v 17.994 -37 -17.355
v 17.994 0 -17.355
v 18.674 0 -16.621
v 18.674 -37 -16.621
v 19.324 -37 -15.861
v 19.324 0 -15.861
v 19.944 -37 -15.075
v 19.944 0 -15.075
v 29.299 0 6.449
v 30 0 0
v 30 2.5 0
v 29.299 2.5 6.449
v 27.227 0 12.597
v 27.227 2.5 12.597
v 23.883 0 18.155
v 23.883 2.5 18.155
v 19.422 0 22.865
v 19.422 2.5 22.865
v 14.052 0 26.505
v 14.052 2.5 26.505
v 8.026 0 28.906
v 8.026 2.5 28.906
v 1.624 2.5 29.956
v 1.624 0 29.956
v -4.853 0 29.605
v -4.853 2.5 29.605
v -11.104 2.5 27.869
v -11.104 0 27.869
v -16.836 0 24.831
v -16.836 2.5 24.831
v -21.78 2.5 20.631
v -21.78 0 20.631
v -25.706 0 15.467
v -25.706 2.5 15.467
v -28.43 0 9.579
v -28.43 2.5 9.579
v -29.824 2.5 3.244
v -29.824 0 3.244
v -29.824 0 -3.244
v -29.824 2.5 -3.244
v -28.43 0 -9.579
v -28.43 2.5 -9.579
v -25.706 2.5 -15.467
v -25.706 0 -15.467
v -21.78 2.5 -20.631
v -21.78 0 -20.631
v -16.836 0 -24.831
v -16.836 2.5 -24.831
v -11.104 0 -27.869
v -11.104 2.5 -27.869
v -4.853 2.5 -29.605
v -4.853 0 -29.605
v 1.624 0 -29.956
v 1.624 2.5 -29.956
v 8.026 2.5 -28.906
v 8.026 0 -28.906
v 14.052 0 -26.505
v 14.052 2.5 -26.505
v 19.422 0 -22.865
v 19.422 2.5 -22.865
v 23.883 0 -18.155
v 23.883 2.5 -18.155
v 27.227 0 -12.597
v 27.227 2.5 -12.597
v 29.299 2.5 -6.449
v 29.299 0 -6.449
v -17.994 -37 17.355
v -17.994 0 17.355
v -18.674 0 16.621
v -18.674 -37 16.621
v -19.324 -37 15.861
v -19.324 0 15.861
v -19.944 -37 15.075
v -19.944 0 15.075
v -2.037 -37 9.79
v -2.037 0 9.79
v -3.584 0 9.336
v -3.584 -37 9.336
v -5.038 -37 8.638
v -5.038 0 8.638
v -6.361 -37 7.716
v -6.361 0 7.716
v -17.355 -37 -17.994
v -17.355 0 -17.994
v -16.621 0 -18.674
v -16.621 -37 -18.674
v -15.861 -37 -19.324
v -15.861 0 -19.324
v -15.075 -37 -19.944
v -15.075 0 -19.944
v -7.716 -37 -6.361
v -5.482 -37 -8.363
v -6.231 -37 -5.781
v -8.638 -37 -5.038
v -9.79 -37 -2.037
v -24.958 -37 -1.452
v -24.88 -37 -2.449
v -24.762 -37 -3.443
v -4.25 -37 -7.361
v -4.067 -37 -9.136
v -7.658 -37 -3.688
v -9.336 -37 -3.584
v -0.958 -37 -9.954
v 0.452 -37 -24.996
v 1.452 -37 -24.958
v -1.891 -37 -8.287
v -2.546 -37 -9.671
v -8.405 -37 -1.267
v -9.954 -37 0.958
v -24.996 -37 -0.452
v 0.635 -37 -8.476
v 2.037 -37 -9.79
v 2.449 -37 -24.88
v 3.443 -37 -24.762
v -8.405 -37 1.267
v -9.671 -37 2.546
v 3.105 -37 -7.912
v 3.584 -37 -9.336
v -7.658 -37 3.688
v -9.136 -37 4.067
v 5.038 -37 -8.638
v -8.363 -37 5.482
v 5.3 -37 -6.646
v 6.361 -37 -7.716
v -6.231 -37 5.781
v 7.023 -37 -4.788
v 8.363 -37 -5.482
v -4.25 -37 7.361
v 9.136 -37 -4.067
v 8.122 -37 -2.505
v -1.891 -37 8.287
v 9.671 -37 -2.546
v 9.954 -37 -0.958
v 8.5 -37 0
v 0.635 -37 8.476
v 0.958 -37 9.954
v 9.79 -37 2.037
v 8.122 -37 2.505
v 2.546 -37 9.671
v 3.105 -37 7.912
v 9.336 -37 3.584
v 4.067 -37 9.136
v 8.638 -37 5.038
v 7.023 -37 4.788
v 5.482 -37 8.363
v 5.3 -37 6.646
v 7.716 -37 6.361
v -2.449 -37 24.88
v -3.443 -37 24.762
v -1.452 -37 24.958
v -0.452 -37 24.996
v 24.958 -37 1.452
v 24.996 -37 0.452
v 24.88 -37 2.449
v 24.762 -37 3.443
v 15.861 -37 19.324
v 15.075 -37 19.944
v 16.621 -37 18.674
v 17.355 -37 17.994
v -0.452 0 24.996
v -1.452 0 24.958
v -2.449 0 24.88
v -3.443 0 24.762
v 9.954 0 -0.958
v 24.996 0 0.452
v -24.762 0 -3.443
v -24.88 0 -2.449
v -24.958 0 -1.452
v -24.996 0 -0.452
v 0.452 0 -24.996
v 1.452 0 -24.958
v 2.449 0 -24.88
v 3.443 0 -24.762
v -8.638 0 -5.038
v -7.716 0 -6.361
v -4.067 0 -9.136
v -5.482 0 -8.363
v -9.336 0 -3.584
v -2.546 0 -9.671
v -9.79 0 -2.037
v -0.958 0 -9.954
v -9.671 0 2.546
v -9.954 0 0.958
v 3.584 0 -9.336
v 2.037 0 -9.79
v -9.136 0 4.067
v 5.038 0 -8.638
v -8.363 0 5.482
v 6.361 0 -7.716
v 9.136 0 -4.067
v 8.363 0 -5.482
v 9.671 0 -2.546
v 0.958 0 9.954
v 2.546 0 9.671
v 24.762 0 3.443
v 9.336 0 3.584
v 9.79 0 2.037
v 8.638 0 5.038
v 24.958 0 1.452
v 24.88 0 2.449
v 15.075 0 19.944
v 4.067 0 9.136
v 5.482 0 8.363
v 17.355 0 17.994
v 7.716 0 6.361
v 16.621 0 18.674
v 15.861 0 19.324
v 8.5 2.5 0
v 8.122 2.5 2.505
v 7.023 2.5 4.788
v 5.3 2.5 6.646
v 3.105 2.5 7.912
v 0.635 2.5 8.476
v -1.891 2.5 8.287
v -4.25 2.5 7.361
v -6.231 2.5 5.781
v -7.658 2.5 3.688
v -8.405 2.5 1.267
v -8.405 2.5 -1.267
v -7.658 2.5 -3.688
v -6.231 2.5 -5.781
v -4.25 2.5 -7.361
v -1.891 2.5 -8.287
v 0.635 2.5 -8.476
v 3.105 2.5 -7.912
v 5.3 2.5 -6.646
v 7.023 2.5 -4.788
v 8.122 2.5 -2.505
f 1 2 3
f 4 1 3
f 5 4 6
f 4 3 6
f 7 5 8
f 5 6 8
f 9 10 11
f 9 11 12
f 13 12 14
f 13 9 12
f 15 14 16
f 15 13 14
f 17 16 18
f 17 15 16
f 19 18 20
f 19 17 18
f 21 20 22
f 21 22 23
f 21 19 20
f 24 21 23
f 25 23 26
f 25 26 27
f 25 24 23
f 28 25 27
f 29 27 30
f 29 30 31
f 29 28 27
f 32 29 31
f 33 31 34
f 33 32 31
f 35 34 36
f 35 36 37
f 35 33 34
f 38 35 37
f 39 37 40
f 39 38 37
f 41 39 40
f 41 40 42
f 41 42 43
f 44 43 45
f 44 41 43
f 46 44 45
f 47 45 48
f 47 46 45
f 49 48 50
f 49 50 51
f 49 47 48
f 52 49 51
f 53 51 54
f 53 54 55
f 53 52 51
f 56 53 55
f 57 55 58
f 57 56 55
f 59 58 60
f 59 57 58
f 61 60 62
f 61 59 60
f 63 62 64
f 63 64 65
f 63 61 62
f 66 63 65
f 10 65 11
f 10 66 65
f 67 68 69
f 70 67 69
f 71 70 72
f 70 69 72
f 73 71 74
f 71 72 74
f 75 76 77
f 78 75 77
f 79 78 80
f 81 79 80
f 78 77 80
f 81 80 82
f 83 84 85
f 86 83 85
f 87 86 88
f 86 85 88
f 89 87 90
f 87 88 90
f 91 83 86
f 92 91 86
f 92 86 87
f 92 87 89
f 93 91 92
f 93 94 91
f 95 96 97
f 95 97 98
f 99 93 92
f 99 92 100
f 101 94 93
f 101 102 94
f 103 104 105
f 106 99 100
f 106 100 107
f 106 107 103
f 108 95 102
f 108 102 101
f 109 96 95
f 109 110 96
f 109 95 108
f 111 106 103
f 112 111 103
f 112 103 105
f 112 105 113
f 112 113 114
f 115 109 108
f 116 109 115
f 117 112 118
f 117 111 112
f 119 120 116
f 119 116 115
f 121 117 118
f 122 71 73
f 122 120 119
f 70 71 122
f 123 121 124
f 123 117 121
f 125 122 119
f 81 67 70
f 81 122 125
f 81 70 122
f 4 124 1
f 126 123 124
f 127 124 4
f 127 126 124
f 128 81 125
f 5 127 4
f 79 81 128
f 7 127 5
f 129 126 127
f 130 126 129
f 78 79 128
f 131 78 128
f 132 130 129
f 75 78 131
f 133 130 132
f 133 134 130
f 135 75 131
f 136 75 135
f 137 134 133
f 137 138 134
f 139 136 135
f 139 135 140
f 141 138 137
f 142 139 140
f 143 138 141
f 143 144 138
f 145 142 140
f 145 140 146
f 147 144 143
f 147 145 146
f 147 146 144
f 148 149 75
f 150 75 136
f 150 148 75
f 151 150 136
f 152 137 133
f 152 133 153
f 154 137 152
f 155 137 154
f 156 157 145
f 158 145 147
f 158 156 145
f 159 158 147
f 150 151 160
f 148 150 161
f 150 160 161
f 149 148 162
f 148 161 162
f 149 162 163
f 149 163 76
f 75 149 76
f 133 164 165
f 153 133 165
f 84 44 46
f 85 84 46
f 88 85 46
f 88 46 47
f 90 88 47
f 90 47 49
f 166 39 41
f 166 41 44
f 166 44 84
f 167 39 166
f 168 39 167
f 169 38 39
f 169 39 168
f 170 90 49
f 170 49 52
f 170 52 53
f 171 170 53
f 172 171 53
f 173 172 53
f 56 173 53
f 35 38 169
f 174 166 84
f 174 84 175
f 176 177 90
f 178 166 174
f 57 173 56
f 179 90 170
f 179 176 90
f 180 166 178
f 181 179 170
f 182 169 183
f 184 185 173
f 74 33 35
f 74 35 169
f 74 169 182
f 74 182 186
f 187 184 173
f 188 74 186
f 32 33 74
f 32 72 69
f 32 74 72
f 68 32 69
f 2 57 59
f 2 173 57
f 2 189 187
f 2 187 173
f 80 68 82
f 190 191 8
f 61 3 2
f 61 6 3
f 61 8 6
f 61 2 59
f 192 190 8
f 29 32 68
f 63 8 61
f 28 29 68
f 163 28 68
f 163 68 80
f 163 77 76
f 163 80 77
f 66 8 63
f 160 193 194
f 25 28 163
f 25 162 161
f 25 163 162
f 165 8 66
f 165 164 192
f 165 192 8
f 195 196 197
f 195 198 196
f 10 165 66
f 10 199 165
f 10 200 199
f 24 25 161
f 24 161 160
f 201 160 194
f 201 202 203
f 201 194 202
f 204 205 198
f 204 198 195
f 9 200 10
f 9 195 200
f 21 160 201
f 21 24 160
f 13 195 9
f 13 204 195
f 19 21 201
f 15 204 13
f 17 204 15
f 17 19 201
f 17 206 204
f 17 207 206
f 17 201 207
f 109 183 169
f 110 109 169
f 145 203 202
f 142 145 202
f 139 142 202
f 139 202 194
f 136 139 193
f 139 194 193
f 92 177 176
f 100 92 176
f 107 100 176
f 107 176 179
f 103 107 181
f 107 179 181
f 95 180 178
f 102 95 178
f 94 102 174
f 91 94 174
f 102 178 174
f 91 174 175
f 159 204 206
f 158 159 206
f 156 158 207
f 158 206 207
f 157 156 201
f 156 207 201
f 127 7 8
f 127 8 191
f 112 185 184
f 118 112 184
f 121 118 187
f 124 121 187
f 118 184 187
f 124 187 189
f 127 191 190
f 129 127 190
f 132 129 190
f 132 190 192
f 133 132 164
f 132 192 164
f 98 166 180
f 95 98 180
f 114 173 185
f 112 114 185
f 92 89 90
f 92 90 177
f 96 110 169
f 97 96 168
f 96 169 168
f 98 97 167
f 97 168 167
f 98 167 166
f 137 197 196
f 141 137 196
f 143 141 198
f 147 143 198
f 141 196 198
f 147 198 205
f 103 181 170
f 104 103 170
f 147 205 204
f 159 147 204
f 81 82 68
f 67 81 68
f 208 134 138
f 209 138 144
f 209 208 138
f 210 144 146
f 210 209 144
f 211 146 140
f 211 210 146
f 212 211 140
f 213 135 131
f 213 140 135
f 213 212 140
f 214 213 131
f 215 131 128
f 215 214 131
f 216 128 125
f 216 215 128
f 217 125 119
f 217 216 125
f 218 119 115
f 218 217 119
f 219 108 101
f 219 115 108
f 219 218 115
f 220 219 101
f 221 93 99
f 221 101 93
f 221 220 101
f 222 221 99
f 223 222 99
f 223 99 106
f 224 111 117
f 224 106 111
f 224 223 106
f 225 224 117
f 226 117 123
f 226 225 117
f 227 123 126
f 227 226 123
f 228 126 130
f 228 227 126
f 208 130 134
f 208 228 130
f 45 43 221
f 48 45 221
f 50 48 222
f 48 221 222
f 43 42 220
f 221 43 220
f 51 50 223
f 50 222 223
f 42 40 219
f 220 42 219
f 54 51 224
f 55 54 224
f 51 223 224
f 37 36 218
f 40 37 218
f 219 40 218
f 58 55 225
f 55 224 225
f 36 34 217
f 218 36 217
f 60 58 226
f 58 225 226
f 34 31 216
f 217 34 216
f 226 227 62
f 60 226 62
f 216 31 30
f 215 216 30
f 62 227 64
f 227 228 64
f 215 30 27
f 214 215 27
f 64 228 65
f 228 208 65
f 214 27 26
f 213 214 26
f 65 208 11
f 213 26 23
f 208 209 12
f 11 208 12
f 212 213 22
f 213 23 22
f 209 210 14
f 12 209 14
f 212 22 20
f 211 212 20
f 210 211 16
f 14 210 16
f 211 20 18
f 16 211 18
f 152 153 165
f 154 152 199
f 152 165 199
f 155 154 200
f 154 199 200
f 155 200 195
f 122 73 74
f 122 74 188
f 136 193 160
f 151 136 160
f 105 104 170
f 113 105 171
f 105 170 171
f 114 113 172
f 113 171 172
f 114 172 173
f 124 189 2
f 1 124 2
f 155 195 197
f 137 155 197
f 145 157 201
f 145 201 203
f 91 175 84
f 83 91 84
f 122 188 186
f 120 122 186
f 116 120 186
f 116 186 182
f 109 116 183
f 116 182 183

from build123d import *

# Parameters (mm, degrees)
F0_R     = 30
F0_R_2   = 8.5
F1_DEPTH = 2.5
F3_DEPTH = 37
F4_DEPTH = 40


with BuildPart() as f1:
    # F0 (on Front) → F1 (new body)
    with BuildSketch(Plane.XZ):
        Circle(F0_R)
        Circle(F0_R_2, mode=Mode.SUBTRACT)
    extrude(amount=-F1_DEPTH)

    # F2 (on Front) → F3 (join)
    with BuildSketch(Plane.XZ):
        with BuildLine():
            ThreePointArc((9.9539621754, -0.9584555339), (9.9884839128, -0.4797802861), (10, 0))
            ThreePointArc((10, 0), (9.9474412154, 1.0239205366), (9.790317347, 2.0370778693))
            ThreePointArc((9.790317347, 2.0370778693), (9.0162927853, 4.3250970404), (7.7162445614, 6.3607837464))
            ThreePointArc((7.7162445614, 6.3607837464), (6.6748253827, 7.4462545021), (5.4823682108, 8.3632313612))
            ThreePointArc((5.4823682108, 8.3632313612), (3.3171763231, 9.4337872163), (0.9584555339, 9.9539621754))
            ThreePointArc((0.9584555339, 9.9539621754), (-0.5454827615, 9.9851113442), (-2.0370778693, 9.790317347))
            ThreePointArc((-2.0370778693, 9.790317347), (-4.3250970404, 9.0162927853), (-6.3607837464, 7.7162445614))
            ThreePointArc((-6.3607837464, 7.7162445614), (-7.4462545021, 6.6748253827), (-8.3632313612, 5.4823682108))
            ThreePointArc((-8.3632313612, 5.4823682108), (-9.4337872163, 3.3171763231), (-9.9539621754, 0.9584555339))
            ThreePointArc((-9.9539621754, 0.9584555339), (-9.9851113442, -0.5454827615), (-9.790317347, -2.0370778693))
            ThreePointArc((-9.790317347, -2.0370778693), (-9.0162927853, -4.3250970404), (-7.7162445614, -6.3607837464))
            ThreePointArc((-7.7162445614, -6.3607837464), (-6.6748253827, -7.4462545021), (-5.4823682108, -8.3632313612))
            ThreePointArc((-5.4823682108, -8.3632313612), (-3.3171763231, -9.4337872163), (-0.9584555339, -9.9539621754))
            ThreePointArc((-0.9584555339, -9.9539621754), (0.5454827615, -9.9851113442), (2.0370778693, -9.790317347))
            ThreePointArc((2.0370778693, -9.790317347), (4.3250970404, -9.0162927853), (6.3607837464, -7.7162445614))
            ThreePointArc((6.3607837464, -7.7162445614), (7.4462545021, -6.6748253827), (8.3632313612, -5.4823682108))
            ThreePointArc((8.3632313612, -5.4823682108), (9.4337872163, -3.3171763231), (9.9539621754, -0.9584555339))
        make_face()
        with BuildLine():
            ThreePointArc((-8.3632313612, 5.4823682108), (-7.4462545021, 6.6748253827), (-6.3607837464, 7.7162445614))
            Line((-6.3607837464, 7.7162445614), (-17.9943087682, 17.355254304))
            ThreePointArc((-17.9943087682, 17.355254304), (-19.0032050673, 16.2443281539), (-19.9436281467, 15.0748696959))
            Line((-19.9436281467, 15.0748696959), (-8.3632313612, 5.4823682108))
        make_face()
        with BuildLine():
            Line((-15.0748696959, -19.9436281467), (-5.4823682108, -8.3632313612))
            ThreePointArc((-5.4823682108, -8.3632313612), (-6.6748253827, -7.4462545021), (-7.7162445614, -6.3607837464))
            Line((-7.7162445614, -6.3607837464), (-17.355254304, -17.9943087682))
            ThreePointArc((-17.355254304, -17.9943087682), (-16.2443281539, -19.0032050673), (-15.0748696959, -19.9436281467))
        make_face()
        with BuildLine():
            Line((3.4427321165, -24.7618172914), (2.0370778693, -9.790317347))
            ThreePointArc((2.0370778693, -9.790317347), (0.5454827615, -9.9851113442), (-0.9584555339, -9.9539621754))
            Line((-0.9584555339, -9.9539621754), (0.4518797452, -24.9959157603))
            ThreePointArc((0.4518797452, -24.9959157603), (1.9508205739, -24.9237697608), (3.4427321165, -24.7618172914))
        make_face()
        with BuildLine():
            Line((19.9436281467, -15.0748696959), (8.3632313612, -5.4823682108))
            ThreePointArc((8.3632313612, -5.4823682108), (7.4462545021, -6.6748253827), (6.3607837464, -7.7162445614))
            Line((6.3607837464, -7.7162445614), (17.9943087682, -17.355254304))
            ThreePointArc((17.9943087682, -17.355254304), (19.0032050673, -16.2443281539), (19.9436281467, -15.0748696959))
        make_face()
        with BuildLine():
            ThreePointArc((9.790317347, 2.0370778693), (9.9474412154, 1.0239205366), (10, 0))
            ThreePointArc((10, 0), (9.9884839128, -0.4797802861), (9.9539621754, -0.9584555339))
            Line((9.9539621754, -0.9584555339), (24.9959157603, 0.4518797452))
            ThreePointArc((24.9959157603, 0.4518797452), (24.9237697608, 1.9508205739), (24.7618172914, 3.4427321165))
            Line((24.7618172914, 3.4427321165), (9.790317347, 2.0370778693))
        make_face()
        with BuildLine():
            ThreePointArc((5.4823682108, 8.3632313612), (6.6748253827, 7.4462545021), (7.7162445614, 6.3607837464))
            Line((7.7162445614, 6.3607837464), (17.355254304, 17.9943087682))
            ThreePointArc((17.355254304, 17.9943087682), (16.2443281539, 19.0032050673), (15.0748696959, 19.9436281467))
            Line((15.0748696959, 19.9436281467), (5.4823682108, 8.3632313612))
        make_face()
        with BuildLine():
            ThreePointArc((-2.0370778693, 9.790317347), (-0.5454827615, 9.9851113442), (0.9584555339, 9.9539621754))
            Line((0.9584555339, 9.9539621754), (-0.4518797452, 24.9959157603))
            ThreePointArc((-0.4518797452, 24.9959157603), (-1.9508205739, 24.9237697608), (-3.4427321165, 24.7618172914))
            Line((-3.4427321165, 24.7618172914), (-2.0370778693, 9.790317347))
        make_face()
        with BuildLine():
            ThreePointArc((-9.790317347, -2.0370778693), (-9.9851113442, -0.5454827615), (-9.9539621754, 0.9584555339))
            Line((-9.9539621754, 0.9584555339), (-24.9959157603, -0.4518797452))
            ThreePointArc((-24.9959157603, -0.4518797452), (-24.9237697608, -1.9508205739), (-24.7618172914, -3.4427321165))
            Line((-24.7618172914, -3.4427321165), (-9.790317347, -2.0370778693))
        make_face()
    extrude(amount=F3_DEPTH)

    # F4 (cut): a face of the model
    f4_faces = [f1.faces().sort_by_distance(p)[0] for p in [
        (0, 0, 0),
    ]]
    extrude(f4_faces, amount=-F4_DEPTH, mode=Mode.SUBTRACT)


solid = f1.part
